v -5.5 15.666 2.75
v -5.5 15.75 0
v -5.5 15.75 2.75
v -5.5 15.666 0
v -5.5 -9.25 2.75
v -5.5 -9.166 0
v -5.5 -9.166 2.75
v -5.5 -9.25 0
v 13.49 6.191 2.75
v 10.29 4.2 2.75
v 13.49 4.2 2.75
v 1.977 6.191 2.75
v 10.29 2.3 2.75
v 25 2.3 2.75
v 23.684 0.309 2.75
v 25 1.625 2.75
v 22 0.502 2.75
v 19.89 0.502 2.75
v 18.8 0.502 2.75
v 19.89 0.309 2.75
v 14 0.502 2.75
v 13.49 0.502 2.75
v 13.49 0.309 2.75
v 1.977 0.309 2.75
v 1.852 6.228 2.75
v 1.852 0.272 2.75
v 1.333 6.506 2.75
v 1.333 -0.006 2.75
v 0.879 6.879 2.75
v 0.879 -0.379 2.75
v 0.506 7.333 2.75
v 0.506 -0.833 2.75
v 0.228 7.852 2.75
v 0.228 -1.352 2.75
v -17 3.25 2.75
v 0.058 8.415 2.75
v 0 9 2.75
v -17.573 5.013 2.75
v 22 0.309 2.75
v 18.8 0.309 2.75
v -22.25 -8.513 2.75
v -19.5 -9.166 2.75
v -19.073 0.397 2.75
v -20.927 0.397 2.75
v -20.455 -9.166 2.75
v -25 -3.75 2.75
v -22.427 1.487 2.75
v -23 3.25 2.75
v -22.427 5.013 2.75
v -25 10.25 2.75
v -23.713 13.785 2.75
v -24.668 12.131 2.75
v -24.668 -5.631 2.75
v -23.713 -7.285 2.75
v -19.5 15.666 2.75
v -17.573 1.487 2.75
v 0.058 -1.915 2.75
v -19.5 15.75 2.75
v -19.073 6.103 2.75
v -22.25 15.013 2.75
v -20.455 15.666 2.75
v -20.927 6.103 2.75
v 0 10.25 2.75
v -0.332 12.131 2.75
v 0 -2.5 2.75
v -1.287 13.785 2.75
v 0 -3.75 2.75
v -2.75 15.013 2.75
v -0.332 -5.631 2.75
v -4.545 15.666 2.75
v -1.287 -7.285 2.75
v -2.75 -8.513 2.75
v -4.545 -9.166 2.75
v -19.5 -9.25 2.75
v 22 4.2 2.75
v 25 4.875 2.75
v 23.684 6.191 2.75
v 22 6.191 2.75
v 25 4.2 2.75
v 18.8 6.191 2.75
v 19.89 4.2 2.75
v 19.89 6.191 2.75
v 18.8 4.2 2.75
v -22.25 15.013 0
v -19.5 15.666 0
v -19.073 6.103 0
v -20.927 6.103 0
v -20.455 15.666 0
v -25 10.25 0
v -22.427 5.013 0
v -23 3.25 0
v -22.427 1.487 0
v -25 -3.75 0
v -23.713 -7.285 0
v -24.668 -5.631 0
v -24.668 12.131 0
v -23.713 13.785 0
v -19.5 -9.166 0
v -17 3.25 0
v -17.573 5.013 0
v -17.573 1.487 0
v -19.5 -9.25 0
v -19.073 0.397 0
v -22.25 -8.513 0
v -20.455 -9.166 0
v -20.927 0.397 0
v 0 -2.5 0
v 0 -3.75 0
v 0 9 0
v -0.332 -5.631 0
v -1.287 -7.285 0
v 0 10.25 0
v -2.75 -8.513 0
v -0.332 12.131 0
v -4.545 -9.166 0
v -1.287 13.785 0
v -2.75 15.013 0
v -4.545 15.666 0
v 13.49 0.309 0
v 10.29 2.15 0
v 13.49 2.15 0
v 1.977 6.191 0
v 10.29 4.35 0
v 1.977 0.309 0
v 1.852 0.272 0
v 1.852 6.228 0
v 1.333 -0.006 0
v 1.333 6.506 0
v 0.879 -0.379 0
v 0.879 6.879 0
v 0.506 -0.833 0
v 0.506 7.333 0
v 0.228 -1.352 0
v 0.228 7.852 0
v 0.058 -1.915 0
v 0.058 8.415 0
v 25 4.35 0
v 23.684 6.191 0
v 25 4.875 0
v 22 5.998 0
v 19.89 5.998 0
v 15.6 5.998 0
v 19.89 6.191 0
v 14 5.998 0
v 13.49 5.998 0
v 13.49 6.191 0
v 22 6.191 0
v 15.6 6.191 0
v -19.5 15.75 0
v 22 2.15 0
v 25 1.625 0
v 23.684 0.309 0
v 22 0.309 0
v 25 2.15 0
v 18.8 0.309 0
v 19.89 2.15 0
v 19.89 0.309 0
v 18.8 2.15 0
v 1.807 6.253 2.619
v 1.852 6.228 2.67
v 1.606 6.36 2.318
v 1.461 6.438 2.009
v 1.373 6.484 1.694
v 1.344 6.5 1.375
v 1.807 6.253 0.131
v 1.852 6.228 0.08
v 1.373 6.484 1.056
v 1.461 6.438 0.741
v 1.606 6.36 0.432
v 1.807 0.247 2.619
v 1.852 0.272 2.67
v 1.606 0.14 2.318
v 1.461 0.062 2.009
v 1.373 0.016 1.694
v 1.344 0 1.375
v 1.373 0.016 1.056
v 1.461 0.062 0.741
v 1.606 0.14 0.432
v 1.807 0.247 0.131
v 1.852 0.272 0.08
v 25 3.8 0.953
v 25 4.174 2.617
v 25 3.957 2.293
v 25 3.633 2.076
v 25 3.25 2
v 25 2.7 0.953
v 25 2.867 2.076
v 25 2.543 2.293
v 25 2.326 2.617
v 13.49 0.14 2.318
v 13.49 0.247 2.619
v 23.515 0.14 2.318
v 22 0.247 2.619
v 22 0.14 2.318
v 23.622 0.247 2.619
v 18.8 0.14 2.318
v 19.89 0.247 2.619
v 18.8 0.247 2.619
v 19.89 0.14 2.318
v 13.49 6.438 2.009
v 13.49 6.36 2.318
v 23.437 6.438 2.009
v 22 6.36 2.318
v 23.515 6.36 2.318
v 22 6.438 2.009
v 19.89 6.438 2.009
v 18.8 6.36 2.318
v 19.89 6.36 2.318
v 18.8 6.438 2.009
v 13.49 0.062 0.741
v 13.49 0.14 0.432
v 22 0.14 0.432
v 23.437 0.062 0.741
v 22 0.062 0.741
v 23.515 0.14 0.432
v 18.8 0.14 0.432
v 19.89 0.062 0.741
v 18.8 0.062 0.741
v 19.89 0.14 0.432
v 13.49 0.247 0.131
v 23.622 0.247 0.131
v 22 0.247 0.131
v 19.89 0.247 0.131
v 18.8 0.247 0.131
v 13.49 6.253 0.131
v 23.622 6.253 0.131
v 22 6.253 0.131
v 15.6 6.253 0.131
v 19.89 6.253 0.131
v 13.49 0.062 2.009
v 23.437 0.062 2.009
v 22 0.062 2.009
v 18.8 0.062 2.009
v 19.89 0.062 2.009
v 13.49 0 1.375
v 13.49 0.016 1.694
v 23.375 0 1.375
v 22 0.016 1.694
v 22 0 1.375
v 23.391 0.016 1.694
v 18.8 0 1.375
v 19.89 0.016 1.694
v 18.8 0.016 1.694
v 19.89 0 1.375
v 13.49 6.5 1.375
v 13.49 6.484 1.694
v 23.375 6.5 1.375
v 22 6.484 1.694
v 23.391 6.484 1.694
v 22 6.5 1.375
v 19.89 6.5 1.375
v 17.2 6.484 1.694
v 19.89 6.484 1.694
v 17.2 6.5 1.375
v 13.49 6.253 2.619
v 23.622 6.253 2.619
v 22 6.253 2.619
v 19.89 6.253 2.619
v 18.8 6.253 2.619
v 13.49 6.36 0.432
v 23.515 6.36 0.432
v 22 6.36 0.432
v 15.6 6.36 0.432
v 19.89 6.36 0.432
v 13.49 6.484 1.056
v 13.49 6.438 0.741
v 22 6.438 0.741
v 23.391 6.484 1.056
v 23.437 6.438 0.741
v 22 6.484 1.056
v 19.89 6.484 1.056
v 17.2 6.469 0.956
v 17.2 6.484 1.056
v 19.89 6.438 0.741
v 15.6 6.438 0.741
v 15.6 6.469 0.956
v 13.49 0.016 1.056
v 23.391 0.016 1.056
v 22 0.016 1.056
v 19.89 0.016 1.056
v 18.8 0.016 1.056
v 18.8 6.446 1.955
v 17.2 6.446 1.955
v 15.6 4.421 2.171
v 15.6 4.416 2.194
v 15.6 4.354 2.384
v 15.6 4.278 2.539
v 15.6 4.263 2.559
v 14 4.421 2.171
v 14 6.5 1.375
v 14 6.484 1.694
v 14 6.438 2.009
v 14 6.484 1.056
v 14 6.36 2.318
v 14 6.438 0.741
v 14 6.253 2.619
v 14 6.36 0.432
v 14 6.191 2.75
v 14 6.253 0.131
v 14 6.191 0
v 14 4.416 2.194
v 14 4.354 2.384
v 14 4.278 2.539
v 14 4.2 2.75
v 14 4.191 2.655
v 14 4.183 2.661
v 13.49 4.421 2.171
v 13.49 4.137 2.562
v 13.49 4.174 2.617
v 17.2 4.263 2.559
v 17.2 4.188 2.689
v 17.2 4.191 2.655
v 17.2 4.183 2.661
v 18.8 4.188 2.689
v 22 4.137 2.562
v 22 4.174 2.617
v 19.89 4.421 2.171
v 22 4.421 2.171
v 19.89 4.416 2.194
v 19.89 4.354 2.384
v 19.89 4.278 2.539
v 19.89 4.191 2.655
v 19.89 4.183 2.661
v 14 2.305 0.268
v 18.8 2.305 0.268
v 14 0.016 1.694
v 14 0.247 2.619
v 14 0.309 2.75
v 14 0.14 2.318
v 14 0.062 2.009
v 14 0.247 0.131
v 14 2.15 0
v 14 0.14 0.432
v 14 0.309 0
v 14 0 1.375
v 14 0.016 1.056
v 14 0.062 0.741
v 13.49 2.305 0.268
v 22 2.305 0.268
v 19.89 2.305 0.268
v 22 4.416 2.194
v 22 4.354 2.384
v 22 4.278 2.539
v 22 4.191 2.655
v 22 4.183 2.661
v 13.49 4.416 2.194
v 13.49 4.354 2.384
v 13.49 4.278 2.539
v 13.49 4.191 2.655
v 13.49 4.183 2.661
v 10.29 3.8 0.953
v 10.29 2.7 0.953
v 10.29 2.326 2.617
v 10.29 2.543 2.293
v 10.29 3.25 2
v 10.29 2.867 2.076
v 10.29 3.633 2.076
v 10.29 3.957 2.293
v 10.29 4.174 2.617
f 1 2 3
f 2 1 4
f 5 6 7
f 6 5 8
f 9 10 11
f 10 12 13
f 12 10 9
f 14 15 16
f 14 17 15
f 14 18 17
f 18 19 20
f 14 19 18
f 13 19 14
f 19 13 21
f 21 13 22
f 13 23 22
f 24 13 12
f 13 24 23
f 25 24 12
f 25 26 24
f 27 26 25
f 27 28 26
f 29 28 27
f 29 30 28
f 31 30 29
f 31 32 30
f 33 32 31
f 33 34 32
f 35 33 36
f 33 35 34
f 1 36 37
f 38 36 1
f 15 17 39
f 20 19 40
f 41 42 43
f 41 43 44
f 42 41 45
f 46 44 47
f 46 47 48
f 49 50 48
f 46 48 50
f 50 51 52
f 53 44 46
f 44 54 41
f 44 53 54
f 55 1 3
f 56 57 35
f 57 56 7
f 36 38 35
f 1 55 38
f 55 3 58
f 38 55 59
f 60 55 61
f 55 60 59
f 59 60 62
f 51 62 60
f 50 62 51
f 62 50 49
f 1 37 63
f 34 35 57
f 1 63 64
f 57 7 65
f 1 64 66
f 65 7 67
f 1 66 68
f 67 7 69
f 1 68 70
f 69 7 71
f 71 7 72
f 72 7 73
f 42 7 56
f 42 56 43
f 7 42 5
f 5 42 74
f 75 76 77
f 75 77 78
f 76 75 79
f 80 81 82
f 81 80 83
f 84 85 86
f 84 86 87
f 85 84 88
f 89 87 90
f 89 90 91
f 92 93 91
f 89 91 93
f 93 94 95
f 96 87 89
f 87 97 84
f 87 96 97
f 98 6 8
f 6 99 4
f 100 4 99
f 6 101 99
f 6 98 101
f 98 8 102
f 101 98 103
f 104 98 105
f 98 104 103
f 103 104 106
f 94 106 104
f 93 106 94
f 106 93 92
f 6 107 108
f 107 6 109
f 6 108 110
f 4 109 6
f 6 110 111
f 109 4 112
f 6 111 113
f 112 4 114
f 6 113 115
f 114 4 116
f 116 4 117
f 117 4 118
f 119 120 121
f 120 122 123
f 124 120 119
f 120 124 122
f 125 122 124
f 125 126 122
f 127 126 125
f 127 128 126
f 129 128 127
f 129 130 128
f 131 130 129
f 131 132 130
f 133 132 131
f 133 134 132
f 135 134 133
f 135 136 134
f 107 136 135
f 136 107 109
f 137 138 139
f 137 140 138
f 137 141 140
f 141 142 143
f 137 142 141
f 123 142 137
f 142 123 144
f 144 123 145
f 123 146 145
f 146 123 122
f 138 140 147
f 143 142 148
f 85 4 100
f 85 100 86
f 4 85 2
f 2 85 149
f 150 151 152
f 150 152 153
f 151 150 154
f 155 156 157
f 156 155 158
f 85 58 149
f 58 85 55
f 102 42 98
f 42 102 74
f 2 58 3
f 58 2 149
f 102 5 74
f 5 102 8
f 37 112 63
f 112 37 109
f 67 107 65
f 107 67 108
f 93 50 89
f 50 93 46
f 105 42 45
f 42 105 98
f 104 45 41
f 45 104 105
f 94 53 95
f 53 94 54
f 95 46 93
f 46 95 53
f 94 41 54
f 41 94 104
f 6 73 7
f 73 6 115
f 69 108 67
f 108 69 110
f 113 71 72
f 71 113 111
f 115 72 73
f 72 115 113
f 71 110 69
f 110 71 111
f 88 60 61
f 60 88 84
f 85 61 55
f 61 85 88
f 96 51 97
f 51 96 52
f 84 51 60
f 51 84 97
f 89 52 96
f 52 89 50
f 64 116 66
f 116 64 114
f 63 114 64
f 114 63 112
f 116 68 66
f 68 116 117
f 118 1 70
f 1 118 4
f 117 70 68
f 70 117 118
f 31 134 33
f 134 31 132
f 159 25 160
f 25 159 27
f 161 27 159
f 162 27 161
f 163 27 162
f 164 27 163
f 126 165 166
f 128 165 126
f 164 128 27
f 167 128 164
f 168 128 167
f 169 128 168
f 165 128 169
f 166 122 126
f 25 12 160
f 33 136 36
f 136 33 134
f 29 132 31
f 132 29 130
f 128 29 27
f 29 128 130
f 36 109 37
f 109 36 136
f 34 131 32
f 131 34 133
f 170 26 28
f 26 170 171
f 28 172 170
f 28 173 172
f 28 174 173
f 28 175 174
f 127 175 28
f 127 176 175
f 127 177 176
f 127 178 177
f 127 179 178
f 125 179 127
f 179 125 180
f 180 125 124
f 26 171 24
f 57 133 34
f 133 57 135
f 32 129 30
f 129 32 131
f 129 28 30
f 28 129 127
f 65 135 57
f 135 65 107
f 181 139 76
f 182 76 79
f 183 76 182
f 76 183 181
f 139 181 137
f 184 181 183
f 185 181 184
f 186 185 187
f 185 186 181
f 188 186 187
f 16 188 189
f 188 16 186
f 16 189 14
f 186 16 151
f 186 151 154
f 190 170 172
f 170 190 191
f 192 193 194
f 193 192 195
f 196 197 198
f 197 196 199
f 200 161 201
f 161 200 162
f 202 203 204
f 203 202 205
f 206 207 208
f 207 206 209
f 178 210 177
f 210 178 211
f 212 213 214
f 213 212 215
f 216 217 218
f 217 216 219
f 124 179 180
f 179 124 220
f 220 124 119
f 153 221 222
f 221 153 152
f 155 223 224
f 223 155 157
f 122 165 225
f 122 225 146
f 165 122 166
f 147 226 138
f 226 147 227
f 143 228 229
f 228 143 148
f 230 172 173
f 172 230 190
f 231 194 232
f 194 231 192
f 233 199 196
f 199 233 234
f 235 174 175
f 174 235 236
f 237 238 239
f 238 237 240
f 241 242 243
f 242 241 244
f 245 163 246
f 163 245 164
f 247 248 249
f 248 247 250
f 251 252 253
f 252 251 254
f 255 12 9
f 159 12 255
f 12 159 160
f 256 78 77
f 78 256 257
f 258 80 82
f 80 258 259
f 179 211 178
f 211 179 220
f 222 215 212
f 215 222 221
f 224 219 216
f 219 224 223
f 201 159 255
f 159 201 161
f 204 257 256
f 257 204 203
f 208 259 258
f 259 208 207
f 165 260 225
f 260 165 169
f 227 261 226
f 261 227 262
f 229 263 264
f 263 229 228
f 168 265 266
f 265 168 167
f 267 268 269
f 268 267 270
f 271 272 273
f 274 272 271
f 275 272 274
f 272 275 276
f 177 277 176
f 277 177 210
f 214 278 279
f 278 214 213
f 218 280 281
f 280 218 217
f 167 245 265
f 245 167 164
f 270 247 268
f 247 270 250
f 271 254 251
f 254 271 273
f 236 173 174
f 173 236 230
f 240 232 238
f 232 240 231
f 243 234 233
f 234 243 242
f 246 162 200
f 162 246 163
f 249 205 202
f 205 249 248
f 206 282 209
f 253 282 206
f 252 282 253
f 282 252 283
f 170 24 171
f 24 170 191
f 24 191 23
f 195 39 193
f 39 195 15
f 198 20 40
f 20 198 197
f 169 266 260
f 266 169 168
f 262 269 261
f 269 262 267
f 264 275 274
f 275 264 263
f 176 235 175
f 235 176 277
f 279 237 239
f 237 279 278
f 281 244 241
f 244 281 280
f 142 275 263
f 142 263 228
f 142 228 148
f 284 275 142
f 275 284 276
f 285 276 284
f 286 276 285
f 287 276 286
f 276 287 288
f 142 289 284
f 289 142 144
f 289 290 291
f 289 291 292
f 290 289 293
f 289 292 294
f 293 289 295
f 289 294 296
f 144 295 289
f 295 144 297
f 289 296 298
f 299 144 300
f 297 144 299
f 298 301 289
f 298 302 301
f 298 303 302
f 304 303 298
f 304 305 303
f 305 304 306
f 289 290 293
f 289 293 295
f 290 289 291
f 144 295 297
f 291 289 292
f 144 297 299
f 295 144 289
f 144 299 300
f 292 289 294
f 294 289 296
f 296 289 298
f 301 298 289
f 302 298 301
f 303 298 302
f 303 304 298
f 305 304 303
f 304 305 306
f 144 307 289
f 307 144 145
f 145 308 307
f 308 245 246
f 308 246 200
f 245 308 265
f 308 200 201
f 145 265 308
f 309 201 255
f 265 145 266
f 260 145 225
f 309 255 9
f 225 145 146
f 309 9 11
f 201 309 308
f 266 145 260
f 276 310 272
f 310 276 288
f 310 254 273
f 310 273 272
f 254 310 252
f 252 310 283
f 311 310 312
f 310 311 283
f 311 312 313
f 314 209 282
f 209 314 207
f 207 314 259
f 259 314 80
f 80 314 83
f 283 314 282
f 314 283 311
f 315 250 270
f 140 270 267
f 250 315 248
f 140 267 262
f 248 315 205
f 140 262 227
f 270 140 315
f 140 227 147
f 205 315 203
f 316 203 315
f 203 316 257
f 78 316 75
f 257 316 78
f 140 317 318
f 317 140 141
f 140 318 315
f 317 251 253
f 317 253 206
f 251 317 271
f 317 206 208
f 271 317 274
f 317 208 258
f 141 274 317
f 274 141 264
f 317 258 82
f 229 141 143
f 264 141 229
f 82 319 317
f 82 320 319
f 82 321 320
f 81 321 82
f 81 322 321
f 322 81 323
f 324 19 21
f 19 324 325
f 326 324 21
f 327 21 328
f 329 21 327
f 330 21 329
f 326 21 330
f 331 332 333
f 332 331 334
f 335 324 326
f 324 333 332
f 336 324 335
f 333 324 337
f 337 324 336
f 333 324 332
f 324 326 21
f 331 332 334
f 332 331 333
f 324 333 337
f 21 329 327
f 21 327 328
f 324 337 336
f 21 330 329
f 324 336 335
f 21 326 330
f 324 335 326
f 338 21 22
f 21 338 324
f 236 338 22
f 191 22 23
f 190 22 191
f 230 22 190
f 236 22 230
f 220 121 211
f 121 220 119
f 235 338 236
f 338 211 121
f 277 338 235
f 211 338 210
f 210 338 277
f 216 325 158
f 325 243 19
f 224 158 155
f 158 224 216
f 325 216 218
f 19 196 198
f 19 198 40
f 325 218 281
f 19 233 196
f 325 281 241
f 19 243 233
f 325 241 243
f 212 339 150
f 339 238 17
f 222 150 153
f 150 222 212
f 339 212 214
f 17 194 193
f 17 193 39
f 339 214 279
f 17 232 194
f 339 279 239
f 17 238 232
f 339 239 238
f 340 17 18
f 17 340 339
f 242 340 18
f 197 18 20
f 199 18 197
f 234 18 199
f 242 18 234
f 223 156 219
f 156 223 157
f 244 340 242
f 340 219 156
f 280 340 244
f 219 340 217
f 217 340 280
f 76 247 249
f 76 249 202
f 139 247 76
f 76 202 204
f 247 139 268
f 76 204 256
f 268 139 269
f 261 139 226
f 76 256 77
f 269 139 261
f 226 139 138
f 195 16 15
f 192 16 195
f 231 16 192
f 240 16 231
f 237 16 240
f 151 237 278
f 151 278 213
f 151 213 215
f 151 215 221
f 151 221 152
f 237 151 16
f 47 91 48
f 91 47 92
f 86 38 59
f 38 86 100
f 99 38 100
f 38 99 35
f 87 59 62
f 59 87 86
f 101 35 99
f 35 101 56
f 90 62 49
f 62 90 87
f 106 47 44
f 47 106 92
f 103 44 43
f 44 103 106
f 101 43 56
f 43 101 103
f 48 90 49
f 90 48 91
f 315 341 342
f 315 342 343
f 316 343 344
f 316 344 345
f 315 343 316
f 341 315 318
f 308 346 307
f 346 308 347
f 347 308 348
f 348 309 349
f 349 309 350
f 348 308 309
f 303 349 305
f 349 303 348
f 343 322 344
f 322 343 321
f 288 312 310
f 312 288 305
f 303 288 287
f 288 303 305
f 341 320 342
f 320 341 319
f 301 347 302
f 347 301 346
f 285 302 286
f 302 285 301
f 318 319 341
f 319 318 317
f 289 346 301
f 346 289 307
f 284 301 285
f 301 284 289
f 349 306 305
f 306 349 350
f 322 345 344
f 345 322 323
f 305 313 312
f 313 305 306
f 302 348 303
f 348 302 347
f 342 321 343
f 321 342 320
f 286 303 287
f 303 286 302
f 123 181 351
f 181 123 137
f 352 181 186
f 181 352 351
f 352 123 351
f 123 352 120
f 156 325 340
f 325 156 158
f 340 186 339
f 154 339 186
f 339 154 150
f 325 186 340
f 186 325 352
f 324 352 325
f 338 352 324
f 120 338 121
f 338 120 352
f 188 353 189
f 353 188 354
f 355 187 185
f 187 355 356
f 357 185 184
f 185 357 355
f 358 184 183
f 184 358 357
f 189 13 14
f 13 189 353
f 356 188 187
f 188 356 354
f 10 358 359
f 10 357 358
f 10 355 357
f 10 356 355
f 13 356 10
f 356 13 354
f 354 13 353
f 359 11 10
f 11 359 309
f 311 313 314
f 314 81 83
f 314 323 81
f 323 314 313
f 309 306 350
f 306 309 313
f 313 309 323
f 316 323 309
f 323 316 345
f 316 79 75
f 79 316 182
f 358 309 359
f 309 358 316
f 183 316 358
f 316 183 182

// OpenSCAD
// Physical Keygen - by Nirav Patel <http://eclecti.cc>
//
// Generate a duplicate of a Kryptonite Evolution bike lock key by editing 
// the last line of the file and entering in the key code of the lock.  If you
// don't know the key code, you're going to need to get creative.  The first
// digit of the code is on the side closest to the shoulder. 6 is the minimum
// cut, which is uncut. 1 (0?) is the maximum cut.
//
// This work is licensed under a Creative Commons Attribution 3.0 Unported License.

module rounded(size, r) {
    union() {
        translate([r, 0, 0]) cube([size[0]-2*r, size[1], size[2]]);
        translate([0, r, 0]) cube([size[0], size[1]-2*r, size[2]]);
        translate([r, r, 0]) cylinder(h=size[2], r=r);
        translate([size[0]-r, r, 0]) cylinder(h=size[2], r=r);
        translate([r, size[1]-r, 0]) cylinder(h=size[2], r=r);
        translate([size[0]-r, size[1]-r, 0]) cylinder(h=size[2], r=r);
    }
}

module fillet(h, r) {
    difference() {
        cube([r, r, h]);
        translate([r, r, 0]) cylinder(h=h, r=r, $fn=32);
    }
}

module disc(thickness, angle) {
    rotate([angle, 0, 0]) cube([thickness, 10, 10]);
}

// Kryptonite U-Lock key.  Reverse engineered with guesses from one key.
module kryptonite(bits) {
    // You may need to adjust these to fit your specific printer settings
    thickness = 2.75;
    length = 25.0;
    width = 6.5;
    
    shoulder = 3.0; // from tip
    depth_inc = 18; // degrees
    num_discs = 5;
    
    spacing = 1.6; // distance from the center of one disc to the next
    disc = 1.11; // thickness of the discs that will turn
    spacer = 0.51; // thickness of the spacers between the discs
    
    // Handle size
    h_l = 25;
    h_w = 25;
    
    difference() {
        union() {
            difference() {
                // blade and key handle
                union() {
                    translate([-h_l, -h_w/2 + width/2, 0]) rounded([h_l, h_w, thickness], 5.5);
                    
                    translate([0, width-0.5, 0]) fillet(thickness, 3);
                    translate([0, 0.5, 0]) mirror([0, 1, 0]) fillet(thickness, 3);
                    
                    intersection() {
                        translate([-1,0,0]) cube([length+1, width, thickness]);
                        
                        translate([-1, width/2, thickness/2]) rotate([0, 90, 0]) cylinder(h=length+1, r=width/2, $fn=64); 
                    }
                }
                
                // chamfer the tip
               translate([length, width*(3/4), 0]) rotate([0, 0, 45]) cube([10, 10, thickness]);
               translate([length, width*(1/4), 0]) rotate([0, 0, 225]) cube([10, 10, thickness]);
                
                // put in a hole for keychain use
                translate([-h_l + 5, width/2, 0]) cylinder(h=thickness, r=3);
         
                // cut the actual bitting
                for (d = [0:(num_discs-1)]) {
                    translate([length-shoulder-((num_discs-1)-d)*spacing-spacer, 4.0, thickness]) disc(spacer, -(6-bits[d])*depth_inc);
                    translate([length-shoulder-((num_discs-1)-d)*spacing-spacing, 4.0, thickness]) disc(disc, -(6-bits[d])*depth_inc);
                    translate([length-shoulder-((num_discs-1)-d)*spacing-(spacing+spacer), 4.0, thickness]) disc(spacer, -(6-bits[d])*depth_inc);
                }
                
                
                // cut some opposing bitting for added strength
                translate([0, width, thickness]) rotate([180, 0, 0])
                for (d = [0:(num_discs-1)]) {
                    if ((bits[d] == 4) || (bits[d] == 5)) {
                        translate([length-shoulder-((num_discs-1)-d)*spacing-spacer, 4.0, thickness]) disc(spacer, -(3)*depth_inc);
                        translate([length-shoulder-((num_discs-1)-d)*spacing-spacing, 4.0, thickness]) disc(disc, -(3)*depth_inc);
                        translate([length-shoulder-((num_discs-1)-d)*spacing-(spacing+spacer), 4.0, thickness]) disc(spacer, -(3)*depth_inc);
                    } else {
                        translate([length-shoulder-((num_discs-1)-d)*spacing-spacer, 4.0, thickness]) disc(spacer, -(6-bits[d])*depth_inc);
                        translate([length-shoulder-((num_discs-1)-d)*spacing-spacing, 4.0, thickness]) disc(disc, -(6-bits[d])*depth_inc);
                        translate([length-shoulder-((num_discs-1)-d)*spacing-(spacing+spacer), 4.0, thickness]) disc(spacer, -(6-bits[d])*depth_inc);
                    }
                }
                
/*
                // cut an open channel into the other side.  one interfacing surface is enough
                translate([length-shoulder-(num_discs*spacing+spacer), 0, 0]) {
                    cube([num_discs*spacing+spacer, 2, thickness]);
                    translate([0, 2, thickness/3]) rotate([220, 0, 0]) cube([num_discs*spacing+spacer, 2, thickness]);
                }
*/
            }
            
            // adds back in some thickness for the low value bits
            union() {
                translate([length-shoulder-(num_discs*spacing+spacer), 4.0, 0]) {
                    cube([num_discs*spacing+spacer, 0.5, thickness-1.25]);
                    translate([0, 0, thickness-1.25]) scale([1, 1, 2.5]) rotate([0, 90, 0]) cylinder(h=num_discs*spacing+spacer, r=0.5, $fn=32);
                }
            }
        }
        
        // cut the channels for the warded disc at the front
        translate([length-shoulder-((num_discs+2)*spacing+spacer), width/2, 0]) rotate([30, 0, 0]) rotate([0, 90, 0]) cylinder(h=length, r=1.1, $fn=6);
        translate([length-shoulder-((num_discs+2)*spacing+spacer), width/2, thickness+0.25]) rotate([0, 90, 0]) cylinder(h=length, r=1.0, $fn=16);
    }
}

// This sample key goes to a lock that is on my desk
kryptonite([3,4,5,6,3]);
